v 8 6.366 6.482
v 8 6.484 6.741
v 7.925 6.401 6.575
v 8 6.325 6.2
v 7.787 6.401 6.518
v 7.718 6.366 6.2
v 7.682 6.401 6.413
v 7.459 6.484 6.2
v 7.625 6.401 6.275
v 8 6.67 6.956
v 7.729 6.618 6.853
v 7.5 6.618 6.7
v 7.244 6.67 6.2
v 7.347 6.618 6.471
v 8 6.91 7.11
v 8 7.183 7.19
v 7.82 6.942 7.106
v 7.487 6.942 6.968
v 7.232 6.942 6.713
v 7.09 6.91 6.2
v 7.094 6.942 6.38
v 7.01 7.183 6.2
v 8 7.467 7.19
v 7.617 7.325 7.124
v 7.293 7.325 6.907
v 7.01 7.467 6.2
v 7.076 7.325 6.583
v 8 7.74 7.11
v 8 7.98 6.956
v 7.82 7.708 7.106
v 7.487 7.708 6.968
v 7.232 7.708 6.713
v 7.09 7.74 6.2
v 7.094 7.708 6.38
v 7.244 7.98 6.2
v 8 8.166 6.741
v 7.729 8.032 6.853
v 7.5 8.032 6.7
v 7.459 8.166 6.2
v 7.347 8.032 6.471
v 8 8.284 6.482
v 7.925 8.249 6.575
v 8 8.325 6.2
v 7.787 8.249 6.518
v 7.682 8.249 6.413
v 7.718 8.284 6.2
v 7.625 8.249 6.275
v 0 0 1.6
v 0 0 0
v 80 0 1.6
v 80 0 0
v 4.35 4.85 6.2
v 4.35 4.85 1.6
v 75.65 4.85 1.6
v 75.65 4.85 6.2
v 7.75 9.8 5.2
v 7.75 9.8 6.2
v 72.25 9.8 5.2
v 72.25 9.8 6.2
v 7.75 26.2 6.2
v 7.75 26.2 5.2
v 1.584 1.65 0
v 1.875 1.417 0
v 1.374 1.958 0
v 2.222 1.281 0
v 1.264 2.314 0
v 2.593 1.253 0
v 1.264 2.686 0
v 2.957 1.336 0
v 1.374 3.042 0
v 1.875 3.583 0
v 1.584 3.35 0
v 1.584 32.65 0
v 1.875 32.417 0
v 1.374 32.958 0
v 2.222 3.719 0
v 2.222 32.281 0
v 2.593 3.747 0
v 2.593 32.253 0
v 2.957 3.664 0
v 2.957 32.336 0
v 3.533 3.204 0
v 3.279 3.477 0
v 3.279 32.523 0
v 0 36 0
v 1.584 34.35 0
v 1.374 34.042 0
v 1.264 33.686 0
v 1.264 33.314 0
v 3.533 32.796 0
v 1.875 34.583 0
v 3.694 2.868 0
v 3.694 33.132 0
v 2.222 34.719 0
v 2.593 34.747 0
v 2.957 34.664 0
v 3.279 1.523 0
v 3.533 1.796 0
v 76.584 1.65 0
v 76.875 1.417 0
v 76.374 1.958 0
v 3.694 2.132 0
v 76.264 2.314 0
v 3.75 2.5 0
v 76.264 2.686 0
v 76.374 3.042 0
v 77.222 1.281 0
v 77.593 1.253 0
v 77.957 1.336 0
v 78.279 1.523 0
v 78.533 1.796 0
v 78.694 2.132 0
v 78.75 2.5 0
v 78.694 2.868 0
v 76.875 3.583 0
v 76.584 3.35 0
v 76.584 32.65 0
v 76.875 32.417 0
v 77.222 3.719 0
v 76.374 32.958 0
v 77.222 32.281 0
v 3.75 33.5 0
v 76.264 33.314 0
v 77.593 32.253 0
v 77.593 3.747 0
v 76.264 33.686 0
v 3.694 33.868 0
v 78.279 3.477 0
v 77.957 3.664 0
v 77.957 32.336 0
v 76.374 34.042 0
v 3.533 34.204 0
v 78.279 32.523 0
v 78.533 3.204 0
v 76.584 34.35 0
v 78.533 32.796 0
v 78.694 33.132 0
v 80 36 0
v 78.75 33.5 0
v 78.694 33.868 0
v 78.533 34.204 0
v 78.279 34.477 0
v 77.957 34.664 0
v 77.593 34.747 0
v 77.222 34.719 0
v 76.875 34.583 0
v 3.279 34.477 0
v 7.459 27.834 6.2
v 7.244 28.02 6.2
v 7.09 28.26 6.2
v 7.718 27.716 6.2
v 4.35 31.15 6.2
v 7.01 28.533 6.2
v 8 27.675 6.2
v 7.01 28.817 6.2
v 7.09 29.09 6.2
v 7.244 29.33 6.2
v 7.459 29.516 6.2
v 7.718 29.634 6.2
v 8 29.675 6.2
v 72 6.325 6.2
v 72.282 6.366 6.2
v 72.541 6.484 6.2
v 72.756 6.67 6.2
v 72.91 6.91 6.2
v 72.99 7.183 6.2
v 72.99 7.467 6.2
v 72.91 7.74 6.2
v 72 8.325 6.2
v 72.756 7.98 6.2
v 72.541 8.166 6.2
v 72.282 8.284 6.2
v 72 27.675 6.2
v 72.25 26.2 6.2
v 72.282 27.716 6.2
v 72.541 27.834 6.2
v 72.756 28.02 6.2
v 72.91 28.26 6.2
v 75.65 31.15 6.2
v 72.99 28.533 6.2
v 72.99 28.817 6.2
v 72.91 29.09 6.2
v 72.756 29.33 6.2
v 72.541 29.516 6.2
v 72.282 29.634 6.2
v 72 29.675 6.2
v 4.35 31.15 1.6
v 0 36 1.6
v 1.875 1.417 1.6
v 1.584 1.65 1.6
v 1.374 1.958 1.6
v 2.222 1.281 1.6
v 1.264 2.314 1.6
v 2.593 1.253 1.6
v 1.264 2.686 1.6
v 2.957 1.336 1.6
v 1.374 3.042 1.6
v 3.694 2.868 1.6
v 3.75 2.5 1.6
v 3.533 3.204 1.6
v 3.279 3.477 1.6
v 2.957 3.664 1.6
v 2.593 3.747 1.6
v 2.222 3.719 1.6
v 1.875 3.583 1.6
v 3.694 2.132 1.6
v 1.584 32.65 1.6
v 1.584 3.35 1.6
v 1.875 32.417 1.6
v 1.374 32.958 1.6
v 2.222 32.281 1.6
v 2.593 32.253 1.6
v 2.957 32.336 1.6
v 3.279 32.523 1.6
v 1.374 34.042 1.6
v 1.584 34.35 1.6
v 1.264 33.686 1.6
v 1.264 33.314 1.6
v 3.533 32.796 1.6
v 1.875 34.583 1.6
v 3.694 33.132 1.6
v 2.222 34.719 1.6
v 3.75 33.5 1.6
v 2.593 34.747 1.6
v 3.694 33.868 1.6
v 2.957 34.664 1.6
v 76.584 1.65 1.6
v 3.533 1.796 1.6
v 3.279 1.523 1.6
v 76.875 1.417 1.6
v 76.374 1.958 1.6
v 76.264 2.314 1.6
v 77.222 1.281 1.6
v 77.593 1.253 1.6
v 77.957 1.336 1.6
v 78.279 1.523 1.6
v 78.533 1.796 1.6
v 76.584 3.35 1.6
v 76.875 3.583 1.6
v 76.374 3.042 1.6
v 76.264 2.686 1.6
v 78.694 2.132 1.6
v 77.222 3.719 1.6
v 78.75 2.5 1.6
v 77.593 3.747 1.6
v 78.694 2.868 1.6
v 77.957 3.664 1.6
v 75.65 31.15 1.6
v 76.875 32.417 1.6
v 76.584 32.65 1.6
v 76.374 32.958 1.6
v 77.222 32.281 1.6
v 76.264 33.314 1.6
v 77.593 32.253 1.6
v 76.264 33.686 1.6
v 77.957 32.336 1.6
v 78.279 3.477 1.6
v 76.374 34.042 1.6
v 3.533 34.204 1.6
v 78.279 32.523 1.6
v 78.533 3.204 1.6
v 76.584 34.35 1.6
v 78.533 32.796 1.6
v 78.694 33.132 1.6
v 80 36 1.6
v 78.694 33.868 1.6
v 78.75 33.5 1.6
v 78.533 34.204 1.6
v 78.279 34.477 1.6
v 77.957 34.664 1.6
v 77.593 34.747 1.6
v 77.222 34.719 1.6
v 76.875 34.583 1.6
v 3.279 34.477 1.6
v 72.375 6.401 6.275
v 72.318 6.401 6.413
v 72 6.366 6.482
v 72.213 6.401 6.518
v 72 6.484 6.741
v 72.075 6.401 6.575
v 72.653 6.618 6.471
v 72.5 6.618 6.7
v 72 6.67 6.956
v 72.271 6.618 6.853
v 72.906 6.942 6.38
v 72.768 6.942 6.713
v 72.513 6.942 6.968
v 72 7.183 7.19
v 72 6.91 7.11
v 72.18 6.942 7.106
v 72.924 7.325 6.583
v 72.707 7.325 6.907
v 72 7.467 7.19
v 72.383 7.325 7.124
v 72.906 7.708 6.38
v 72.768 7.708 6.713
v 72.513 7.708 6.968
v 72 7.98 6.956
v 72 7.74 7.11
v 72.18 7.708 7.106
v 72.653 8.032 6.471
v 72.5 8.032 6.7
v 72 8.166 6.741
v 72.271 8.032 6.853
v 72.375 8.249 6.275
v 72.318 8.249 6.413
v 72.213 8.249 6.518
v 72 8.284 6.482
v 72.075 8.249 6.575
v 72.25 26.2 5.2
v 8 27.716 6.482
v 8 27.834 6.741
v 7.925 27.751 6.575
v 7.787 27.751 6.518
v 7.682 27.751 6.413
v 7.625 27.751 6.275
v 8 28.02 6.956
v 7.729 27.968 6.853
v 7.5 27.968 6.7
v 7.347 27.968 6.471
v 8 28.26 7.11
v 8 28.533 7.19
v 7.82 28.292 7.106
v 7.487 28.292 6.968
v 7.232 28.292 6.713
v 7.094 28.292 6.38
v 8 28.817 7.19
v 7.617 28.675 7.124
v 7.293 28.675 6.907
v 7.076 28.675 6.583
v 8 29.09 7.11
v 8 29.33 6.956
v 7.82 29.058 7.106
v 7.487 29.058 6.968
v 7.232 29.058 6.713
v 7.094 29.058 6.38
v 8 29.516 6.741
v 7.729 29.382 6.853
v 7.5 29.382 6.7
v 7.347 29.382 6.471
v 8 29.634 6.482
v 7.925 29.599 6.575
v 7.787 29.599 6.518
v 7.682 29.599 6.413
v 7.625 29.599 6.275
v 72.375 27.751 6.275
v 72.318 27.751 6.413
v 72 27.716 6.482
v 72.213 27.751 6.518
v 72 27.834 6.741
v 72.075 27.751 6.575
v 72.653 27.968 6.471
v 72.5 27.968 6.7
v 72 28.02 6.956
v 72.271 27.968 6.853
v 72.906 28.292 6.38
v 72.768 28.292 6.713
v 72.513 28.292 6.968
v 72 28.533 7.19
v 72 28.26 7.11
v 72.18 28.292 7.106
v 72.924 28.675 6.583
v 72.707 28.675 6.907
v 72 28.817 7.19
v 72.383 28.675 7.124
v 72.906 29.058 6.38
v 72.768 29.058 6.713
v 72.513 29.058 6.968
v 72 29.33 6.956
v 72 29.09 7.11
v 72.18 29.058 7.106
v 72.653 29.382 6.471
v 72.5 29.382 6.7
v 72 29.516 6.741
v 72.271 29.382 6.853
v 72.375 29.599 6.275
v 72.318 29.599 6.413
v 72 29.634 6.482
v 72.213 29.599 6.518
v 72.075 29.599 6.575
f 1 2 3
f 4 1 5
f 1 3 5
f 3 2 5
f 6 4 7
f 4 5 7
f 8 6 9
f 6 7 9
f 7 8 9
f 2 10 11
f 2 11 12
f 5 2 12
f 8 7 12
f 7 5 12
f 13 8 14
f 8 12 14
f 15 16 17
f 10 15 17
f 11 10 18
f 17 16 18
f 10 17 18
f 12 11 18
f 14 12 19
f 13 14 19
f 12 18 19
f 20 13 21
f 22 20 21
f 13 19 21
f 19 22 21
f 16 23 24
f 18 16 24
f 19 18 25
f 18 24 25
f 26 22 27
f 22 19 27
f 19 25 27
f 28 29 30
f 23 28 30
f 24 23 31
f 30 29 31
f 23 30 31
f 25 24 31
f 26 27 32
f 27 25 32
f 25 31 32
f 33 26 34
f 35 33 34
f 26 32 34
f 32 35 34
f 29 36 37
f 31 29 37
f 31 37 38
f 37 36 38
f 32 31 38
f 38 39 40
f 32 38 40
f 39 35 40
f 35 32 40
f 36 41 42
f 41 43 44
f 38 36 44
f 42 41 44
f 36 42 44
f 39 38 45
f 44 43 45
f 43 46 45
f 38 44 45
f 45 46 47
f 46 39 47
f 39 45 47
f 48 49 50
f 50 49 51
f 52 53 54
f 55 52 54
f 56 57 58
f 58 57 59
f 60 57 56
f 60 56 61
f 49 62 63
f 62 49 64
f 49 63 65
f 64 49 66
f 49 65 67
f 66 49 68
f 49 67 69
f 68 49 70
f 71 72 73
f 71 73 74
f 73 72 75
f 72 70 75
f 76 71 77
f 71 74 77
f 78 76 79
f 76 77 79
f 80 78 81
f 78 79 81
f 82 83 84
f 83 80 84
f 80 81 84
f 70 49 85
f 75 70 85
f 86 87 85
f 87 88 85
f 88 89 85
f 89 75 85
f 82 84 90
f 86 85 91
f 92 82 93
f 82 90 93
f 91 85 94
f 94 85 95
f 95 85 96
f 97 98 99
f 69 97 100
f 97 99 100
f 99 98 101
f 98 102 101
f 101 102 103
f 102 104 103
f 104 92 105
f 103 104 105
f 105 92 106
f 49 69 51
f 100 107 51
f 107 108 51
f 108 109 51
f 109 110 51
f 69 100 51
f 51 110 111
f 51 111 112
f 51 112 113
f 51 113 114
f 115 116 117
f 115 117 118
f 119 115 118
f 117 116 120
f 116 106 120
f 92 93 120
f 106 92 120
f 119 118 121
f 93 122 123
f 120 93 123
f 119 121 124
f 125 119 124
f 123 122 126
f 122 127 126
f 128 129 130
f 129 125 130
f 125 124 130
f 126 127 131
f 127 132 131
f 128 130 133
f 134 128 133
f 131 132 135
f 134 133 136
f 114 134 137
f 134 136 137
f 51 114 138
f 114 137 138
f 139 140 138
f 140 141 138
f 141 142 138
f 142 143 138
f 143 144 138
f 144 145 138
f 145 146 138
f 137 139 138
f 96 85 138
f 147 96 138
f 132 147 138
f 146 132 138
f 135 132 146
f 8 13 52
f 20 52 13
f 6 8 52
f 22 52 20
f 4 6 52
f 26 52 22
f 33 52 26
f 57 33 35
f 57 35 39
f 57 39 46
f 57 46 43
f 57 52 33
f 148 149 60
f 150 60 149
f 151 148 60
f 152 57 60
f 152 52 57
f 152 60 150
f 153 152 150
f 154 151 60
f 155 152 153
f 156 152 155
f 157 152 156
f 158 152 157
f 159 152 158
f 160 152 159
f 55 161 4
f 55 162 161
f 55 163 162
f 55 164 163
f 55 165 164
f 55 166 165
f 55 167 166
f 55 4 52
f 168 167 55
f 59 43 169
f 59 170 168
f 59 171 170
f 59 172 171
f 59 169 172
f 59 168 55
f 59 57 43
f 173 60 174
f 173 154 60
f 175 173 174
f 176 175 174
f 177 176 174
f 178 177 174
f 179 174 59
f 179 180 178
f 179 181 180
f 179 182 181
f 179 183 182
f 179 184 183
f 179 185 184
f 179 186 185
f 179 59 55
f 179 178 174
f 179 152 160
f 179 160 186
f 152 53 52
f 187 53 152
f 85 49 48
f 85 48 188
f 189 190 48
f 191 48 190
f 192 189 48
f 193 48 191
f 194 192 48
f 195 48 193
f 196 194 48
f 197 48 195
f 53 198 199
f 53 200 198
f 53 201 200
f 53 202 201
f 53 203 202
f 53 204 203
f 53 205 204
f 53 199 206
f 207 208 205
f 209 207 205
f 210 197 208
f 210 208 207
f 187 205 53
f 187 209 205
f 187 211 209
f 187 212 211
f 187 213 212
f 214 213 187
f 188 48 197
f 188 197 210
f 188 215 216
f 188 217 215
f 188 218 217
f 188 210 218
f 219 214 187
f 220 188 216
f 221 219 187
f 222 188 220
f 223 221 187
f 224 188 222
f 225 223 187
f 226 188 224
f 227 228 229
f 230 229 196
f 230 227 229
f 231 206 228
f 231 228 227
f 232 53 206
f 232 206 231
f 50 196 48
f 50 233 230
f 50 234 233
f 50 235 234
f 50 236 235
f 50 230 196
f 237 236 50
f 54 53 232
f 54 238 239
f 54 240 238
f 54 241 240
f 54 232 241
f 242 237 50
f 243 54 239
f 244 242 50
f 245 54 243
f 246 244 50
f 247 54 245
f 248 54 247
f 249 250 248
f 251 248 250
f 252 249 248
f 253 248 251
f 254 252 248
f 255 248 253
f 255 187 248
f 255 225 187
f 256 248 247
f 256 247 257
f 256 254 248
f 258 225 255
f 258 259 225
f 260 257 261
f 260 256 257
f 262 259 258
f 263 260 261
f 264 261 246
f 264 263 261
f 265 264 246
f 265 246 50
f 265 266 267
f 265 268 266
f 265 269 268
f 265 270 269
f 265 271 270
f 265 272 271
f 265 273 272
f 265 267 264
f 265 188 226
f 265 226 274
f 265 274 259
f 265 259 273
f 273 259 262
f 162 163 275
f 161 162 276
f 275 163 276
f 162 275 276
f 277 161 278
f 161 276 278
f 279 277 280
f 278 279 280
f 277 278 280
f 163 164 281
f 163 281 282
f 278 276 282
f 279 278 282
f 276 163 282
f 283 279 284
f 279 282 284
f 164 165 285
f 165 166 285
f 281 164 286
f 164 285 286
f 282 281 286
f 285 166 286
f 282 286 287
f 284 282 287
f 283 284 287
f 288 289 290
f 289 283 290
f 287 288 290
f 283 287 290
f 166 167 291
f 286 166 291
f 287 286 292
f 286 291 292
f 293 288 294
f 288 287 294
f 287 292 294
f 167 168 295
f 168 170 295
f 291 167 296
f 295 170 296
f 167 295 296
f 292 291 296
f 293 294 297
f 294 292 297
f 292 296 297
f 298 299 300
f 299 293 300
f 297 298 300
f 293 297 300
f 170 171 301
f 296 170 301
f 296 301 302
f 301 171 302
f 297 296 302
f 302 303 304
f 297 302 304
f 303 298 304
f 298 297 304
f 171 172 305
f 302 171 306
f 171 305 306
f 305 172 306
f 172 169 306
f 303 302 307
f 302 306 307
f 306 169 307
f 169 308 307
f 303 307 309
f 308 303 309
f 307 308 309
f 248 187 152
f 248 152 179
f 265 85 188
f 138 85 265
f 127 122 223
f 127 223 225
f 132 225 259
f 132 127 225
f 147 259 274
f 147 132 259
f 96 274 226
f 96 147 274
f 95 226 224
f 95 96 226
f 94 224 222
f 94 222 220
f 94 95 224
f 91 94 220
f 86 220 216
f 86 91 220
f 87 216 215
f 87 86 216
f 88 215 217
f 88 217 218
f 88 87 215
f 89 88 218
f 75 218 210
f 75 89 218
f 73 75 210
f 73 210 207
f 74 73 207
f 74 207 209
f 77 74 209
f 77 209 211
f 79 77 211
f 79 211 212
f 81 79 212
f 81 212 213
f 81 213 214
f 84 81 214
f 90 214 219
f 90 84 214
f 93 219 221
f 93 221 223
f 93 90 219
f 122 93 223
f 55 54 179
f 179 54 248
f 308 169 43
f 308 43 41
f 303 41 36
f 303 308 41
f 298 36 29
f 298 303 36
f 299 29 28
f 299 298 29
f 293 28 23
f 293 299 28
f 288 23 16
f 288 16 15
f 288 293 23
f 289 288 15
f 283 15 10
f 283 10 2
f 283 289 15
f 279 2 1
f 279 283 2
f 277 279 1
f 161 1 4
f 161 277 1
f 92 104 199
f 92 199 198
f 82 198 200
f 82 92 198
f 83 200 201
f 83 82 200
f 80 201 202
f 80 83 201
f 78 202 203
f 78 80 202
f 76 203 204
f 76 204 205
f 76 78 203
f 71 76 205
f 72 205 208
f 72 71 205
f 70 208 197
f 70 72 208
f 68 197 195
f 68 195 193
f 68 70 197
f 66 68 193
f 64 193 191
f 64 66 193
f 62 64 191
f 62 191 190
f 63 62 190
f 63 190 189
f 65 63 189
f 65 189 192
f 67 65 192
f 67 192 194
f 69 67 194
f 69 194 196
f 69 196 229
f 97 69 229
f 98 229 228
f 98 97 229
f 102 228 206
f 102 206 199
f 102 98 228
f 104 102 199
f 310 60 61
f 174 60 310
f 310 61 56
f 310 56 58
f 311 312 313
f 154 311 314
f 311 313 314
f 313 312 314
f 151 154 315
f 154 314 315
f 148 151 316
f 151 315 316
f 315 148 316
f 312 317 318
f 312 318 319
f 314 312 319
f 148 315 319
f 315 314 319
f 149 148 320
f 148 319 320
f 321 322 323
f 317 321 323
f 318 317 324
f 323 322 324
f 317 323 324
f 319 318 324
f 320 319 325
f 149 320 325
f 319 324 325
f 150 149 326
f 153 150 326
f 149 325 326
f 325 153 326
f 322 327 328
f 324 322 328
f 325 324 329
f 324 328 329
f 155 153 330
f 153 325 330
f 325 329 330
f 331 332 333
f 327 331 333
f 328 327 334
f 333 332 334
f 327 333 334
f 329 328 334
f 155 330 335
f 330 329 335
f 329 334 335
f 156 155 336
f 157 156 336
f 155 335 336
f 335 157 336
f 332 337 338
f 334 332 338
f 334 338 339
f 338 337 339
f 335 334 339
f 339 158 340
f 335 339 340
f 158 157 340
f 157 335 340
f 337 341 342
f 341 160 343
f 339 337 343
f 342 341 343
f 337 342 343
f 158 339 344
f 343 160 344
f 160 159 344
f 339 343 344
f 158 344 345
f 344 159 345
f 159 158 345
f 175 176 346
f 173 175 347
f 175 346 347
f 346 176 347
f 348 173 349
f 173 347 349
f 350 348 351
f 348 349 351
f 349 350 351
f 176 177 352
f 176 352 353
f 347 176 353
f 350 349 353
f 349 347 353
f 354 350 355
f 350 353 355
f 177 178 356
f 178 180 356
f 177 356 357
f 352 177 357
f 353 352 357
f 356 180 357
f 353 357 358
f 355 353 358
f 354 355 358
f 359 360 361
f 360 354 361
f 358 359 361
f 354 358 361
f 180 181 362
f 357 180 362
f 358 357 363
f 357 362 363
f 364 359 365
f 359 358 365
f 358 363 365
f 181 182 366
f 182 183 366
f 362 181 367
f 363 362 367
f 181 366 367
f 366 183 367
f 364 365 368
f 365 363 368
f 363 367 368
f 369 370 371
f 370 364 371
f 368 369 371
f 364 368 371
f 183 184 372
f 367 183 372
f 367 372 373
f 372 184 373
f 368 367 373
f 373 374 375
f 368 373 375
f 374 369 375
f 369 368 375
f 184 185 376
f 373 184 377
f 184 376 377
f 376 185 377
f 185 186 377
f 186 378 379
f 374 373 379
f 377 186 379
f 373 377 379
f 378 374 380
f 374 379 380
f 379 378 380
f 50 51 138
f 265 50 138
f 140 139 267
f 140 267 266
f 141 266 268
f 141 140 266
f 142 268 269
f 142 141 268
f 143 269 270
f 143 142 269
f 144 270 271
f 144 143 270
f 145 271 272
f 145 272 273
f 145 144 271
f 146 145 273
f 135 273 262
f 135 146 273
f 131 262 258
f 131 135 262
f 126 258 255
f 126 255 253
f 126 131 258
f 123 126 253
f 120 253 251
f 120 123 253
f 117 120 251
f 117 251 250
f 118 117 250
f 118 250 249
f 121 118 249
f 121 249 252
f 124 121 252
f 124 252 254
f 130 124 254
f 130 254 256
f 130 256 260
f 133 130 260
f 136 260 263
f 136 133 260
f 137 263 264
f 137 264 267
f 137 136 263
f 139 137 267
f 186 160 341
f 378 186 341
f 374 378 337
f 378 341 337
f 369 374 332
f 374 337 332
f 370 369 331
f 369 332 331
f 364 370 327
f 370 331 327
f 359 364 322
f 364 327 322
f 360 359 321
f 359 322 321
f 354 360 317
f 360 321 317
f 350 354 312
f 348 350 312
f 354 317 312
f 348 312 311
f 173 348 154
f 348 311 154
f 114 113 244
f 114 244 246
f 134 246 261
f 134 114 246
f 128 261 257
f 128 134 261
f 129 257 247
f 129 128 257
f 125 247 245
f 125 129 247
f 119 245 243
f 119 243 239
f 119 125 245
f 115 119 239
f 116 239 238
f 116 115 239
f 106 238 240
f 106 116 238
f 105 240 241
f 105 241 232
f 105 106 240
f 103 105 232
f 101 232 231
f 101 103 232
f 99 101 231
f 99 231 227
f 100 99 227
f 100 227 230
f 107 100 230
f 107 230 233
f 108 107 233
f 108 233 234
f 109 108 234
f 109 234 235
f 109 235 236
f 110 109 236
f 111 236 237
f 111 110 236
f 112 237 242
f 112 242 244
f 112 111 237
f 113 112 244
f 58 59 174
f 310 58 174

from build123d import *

# Parameters (mm, degrees)
CROQUIS1_W              = 80
CROQUIS1_H              = 36
CROQUIS1_R              = 1.25
SALIENTE_EXTRUIR2_DEPTH = 1.6
CROQUIS2_W              = 71.3
CROQUIS2_H              = 26.3
SALIENTE_EXTRUIR3_DEPTH = 4.6
CROQUIS3_W              = 64.5
CROQUIS3_H              = 16.4
CORTAR_EXTRUIR1_DEPTH   = 1
CROQUIS5_R              = 1
SALIENTE_EXTRUIR4_DEPTH = 32
REVOLUCI_N3_ANGLE       = 90


with BuildPart() as part:
    # Croquis1 → Saliente-Extruir2 (new body)
    with BuildSketch(Plane.XY):
        with Locations((40, 18)):
            Rectangle(CROQUIS1_W, CROQUIS1_H)
        with Locations((77.5, 33.5)):
            Circle(CROQUIS1_R, mode=Mode.SUBTRACT)
        with Locations((77.5, 2.5)):
            Circle(CROQUIS1_R, mode=Mode.SUBTRACT)
        with Locations((2.5, 2.5)):
            Circle(CROQUIS1_R, mode=Mode.SUBTRACT)
        with Locations((2.5, 33.5)):
            Circle(CROQUIS1_R, mode=Mode.SUBTRACT)
    extrude(amount=SALIENTE_EXTRUIR2_DEPTH)

    # Croquis2 → Saliente-Extruir3 (add)
    with BuildSketch(Plane.XY.offset(1.6)):
        with Locations((40, 18)):
            Rectangle(CROQUIS2_W, CROQUIS2_H)
    extrude(amount=SALIENTE_EXTRUIR3_DEPTH)

    # Croquis3 → Cortar-Extruir1 (cut)
    with BuildSketch(Plane.XY.offset(6.2)):
        with Locations((40, 18)):
            Rectangle(CROQUIS3_W, CROQUIS3_H)
    extrude(amount=-CORTAR_EXTRUIR1_DEPTH, mode=Mode.SUBTRACT)

    # Croquis5 → Saliente-Extruir4 (add, symmetric)
    with BuildSketch(Plane(origin=(40, 0, 0), x_dir=(0, 0, -1), z_dir=(1, 0, 0))):
        with Locations((-6.2, 28.675)):
            Circle(CROQUIS5_R)
        with Locations((-6.2, 7.325)):
            Circle(CROQUIS5_R)
    extrude(amount=SALIENTE_EXTRUIR4_DEPTH, both=True)

    # Croquis4 → Revolución3 (revolve)
    with BuildSketch(Plane.XY.offset(6.2)):
        with BuildLine():
            Line((72, 29.675), (72, 27.675))
            ThreePointArc((72, 27.675), (73, 28.675), (72, 29.675))
        make_face()
    revolve(axis=Axis((72, 29.675, 6.2), (0, -1, 0)), revolution_arc=REVOLUCI_N3_ANGLE)

    # Croquis6 → Revolución4 (revolve)
    with BuildSketch(Plane.XY.offset(6.2)):
        with BuildLine():
            Line((8, 29.675), (8, 27.675))
            ThreePointArc((8, 27.675), (7, 28.675), (8, 29.675))
        make_face()
    revolve(axis=Axis((8, 29.675, 6.2), (0, -1, 0)))

    # Croquis7 → Revolución5 (revolve)
    with BuildSketch(Plane.XY.offset(6.2)):
        with BuildLine():
            Line((8, 8.325), (8, 6.325))
            ThreePointArc((8, 6.325), (7, 7.325), (8, 8.325))
        make_face()
    revolve(axis=Axis((8, 8.325, 6.2), (0, -1, 0)))

    # Croquis8 → Revolución6 (revolve)
    with BuildSketch(Plane.XY.offset(6.2)):
        with BuildLine():
            Line((72, 8.325), (72, 6.325))
            ThreePointArc((72, 6.325), (73, 7.325), (72, 8.325))
        make_face()
    revolve(axis=Axis((72, 8.325, 6.2), (0, -1, 0)))


solid = part.part
